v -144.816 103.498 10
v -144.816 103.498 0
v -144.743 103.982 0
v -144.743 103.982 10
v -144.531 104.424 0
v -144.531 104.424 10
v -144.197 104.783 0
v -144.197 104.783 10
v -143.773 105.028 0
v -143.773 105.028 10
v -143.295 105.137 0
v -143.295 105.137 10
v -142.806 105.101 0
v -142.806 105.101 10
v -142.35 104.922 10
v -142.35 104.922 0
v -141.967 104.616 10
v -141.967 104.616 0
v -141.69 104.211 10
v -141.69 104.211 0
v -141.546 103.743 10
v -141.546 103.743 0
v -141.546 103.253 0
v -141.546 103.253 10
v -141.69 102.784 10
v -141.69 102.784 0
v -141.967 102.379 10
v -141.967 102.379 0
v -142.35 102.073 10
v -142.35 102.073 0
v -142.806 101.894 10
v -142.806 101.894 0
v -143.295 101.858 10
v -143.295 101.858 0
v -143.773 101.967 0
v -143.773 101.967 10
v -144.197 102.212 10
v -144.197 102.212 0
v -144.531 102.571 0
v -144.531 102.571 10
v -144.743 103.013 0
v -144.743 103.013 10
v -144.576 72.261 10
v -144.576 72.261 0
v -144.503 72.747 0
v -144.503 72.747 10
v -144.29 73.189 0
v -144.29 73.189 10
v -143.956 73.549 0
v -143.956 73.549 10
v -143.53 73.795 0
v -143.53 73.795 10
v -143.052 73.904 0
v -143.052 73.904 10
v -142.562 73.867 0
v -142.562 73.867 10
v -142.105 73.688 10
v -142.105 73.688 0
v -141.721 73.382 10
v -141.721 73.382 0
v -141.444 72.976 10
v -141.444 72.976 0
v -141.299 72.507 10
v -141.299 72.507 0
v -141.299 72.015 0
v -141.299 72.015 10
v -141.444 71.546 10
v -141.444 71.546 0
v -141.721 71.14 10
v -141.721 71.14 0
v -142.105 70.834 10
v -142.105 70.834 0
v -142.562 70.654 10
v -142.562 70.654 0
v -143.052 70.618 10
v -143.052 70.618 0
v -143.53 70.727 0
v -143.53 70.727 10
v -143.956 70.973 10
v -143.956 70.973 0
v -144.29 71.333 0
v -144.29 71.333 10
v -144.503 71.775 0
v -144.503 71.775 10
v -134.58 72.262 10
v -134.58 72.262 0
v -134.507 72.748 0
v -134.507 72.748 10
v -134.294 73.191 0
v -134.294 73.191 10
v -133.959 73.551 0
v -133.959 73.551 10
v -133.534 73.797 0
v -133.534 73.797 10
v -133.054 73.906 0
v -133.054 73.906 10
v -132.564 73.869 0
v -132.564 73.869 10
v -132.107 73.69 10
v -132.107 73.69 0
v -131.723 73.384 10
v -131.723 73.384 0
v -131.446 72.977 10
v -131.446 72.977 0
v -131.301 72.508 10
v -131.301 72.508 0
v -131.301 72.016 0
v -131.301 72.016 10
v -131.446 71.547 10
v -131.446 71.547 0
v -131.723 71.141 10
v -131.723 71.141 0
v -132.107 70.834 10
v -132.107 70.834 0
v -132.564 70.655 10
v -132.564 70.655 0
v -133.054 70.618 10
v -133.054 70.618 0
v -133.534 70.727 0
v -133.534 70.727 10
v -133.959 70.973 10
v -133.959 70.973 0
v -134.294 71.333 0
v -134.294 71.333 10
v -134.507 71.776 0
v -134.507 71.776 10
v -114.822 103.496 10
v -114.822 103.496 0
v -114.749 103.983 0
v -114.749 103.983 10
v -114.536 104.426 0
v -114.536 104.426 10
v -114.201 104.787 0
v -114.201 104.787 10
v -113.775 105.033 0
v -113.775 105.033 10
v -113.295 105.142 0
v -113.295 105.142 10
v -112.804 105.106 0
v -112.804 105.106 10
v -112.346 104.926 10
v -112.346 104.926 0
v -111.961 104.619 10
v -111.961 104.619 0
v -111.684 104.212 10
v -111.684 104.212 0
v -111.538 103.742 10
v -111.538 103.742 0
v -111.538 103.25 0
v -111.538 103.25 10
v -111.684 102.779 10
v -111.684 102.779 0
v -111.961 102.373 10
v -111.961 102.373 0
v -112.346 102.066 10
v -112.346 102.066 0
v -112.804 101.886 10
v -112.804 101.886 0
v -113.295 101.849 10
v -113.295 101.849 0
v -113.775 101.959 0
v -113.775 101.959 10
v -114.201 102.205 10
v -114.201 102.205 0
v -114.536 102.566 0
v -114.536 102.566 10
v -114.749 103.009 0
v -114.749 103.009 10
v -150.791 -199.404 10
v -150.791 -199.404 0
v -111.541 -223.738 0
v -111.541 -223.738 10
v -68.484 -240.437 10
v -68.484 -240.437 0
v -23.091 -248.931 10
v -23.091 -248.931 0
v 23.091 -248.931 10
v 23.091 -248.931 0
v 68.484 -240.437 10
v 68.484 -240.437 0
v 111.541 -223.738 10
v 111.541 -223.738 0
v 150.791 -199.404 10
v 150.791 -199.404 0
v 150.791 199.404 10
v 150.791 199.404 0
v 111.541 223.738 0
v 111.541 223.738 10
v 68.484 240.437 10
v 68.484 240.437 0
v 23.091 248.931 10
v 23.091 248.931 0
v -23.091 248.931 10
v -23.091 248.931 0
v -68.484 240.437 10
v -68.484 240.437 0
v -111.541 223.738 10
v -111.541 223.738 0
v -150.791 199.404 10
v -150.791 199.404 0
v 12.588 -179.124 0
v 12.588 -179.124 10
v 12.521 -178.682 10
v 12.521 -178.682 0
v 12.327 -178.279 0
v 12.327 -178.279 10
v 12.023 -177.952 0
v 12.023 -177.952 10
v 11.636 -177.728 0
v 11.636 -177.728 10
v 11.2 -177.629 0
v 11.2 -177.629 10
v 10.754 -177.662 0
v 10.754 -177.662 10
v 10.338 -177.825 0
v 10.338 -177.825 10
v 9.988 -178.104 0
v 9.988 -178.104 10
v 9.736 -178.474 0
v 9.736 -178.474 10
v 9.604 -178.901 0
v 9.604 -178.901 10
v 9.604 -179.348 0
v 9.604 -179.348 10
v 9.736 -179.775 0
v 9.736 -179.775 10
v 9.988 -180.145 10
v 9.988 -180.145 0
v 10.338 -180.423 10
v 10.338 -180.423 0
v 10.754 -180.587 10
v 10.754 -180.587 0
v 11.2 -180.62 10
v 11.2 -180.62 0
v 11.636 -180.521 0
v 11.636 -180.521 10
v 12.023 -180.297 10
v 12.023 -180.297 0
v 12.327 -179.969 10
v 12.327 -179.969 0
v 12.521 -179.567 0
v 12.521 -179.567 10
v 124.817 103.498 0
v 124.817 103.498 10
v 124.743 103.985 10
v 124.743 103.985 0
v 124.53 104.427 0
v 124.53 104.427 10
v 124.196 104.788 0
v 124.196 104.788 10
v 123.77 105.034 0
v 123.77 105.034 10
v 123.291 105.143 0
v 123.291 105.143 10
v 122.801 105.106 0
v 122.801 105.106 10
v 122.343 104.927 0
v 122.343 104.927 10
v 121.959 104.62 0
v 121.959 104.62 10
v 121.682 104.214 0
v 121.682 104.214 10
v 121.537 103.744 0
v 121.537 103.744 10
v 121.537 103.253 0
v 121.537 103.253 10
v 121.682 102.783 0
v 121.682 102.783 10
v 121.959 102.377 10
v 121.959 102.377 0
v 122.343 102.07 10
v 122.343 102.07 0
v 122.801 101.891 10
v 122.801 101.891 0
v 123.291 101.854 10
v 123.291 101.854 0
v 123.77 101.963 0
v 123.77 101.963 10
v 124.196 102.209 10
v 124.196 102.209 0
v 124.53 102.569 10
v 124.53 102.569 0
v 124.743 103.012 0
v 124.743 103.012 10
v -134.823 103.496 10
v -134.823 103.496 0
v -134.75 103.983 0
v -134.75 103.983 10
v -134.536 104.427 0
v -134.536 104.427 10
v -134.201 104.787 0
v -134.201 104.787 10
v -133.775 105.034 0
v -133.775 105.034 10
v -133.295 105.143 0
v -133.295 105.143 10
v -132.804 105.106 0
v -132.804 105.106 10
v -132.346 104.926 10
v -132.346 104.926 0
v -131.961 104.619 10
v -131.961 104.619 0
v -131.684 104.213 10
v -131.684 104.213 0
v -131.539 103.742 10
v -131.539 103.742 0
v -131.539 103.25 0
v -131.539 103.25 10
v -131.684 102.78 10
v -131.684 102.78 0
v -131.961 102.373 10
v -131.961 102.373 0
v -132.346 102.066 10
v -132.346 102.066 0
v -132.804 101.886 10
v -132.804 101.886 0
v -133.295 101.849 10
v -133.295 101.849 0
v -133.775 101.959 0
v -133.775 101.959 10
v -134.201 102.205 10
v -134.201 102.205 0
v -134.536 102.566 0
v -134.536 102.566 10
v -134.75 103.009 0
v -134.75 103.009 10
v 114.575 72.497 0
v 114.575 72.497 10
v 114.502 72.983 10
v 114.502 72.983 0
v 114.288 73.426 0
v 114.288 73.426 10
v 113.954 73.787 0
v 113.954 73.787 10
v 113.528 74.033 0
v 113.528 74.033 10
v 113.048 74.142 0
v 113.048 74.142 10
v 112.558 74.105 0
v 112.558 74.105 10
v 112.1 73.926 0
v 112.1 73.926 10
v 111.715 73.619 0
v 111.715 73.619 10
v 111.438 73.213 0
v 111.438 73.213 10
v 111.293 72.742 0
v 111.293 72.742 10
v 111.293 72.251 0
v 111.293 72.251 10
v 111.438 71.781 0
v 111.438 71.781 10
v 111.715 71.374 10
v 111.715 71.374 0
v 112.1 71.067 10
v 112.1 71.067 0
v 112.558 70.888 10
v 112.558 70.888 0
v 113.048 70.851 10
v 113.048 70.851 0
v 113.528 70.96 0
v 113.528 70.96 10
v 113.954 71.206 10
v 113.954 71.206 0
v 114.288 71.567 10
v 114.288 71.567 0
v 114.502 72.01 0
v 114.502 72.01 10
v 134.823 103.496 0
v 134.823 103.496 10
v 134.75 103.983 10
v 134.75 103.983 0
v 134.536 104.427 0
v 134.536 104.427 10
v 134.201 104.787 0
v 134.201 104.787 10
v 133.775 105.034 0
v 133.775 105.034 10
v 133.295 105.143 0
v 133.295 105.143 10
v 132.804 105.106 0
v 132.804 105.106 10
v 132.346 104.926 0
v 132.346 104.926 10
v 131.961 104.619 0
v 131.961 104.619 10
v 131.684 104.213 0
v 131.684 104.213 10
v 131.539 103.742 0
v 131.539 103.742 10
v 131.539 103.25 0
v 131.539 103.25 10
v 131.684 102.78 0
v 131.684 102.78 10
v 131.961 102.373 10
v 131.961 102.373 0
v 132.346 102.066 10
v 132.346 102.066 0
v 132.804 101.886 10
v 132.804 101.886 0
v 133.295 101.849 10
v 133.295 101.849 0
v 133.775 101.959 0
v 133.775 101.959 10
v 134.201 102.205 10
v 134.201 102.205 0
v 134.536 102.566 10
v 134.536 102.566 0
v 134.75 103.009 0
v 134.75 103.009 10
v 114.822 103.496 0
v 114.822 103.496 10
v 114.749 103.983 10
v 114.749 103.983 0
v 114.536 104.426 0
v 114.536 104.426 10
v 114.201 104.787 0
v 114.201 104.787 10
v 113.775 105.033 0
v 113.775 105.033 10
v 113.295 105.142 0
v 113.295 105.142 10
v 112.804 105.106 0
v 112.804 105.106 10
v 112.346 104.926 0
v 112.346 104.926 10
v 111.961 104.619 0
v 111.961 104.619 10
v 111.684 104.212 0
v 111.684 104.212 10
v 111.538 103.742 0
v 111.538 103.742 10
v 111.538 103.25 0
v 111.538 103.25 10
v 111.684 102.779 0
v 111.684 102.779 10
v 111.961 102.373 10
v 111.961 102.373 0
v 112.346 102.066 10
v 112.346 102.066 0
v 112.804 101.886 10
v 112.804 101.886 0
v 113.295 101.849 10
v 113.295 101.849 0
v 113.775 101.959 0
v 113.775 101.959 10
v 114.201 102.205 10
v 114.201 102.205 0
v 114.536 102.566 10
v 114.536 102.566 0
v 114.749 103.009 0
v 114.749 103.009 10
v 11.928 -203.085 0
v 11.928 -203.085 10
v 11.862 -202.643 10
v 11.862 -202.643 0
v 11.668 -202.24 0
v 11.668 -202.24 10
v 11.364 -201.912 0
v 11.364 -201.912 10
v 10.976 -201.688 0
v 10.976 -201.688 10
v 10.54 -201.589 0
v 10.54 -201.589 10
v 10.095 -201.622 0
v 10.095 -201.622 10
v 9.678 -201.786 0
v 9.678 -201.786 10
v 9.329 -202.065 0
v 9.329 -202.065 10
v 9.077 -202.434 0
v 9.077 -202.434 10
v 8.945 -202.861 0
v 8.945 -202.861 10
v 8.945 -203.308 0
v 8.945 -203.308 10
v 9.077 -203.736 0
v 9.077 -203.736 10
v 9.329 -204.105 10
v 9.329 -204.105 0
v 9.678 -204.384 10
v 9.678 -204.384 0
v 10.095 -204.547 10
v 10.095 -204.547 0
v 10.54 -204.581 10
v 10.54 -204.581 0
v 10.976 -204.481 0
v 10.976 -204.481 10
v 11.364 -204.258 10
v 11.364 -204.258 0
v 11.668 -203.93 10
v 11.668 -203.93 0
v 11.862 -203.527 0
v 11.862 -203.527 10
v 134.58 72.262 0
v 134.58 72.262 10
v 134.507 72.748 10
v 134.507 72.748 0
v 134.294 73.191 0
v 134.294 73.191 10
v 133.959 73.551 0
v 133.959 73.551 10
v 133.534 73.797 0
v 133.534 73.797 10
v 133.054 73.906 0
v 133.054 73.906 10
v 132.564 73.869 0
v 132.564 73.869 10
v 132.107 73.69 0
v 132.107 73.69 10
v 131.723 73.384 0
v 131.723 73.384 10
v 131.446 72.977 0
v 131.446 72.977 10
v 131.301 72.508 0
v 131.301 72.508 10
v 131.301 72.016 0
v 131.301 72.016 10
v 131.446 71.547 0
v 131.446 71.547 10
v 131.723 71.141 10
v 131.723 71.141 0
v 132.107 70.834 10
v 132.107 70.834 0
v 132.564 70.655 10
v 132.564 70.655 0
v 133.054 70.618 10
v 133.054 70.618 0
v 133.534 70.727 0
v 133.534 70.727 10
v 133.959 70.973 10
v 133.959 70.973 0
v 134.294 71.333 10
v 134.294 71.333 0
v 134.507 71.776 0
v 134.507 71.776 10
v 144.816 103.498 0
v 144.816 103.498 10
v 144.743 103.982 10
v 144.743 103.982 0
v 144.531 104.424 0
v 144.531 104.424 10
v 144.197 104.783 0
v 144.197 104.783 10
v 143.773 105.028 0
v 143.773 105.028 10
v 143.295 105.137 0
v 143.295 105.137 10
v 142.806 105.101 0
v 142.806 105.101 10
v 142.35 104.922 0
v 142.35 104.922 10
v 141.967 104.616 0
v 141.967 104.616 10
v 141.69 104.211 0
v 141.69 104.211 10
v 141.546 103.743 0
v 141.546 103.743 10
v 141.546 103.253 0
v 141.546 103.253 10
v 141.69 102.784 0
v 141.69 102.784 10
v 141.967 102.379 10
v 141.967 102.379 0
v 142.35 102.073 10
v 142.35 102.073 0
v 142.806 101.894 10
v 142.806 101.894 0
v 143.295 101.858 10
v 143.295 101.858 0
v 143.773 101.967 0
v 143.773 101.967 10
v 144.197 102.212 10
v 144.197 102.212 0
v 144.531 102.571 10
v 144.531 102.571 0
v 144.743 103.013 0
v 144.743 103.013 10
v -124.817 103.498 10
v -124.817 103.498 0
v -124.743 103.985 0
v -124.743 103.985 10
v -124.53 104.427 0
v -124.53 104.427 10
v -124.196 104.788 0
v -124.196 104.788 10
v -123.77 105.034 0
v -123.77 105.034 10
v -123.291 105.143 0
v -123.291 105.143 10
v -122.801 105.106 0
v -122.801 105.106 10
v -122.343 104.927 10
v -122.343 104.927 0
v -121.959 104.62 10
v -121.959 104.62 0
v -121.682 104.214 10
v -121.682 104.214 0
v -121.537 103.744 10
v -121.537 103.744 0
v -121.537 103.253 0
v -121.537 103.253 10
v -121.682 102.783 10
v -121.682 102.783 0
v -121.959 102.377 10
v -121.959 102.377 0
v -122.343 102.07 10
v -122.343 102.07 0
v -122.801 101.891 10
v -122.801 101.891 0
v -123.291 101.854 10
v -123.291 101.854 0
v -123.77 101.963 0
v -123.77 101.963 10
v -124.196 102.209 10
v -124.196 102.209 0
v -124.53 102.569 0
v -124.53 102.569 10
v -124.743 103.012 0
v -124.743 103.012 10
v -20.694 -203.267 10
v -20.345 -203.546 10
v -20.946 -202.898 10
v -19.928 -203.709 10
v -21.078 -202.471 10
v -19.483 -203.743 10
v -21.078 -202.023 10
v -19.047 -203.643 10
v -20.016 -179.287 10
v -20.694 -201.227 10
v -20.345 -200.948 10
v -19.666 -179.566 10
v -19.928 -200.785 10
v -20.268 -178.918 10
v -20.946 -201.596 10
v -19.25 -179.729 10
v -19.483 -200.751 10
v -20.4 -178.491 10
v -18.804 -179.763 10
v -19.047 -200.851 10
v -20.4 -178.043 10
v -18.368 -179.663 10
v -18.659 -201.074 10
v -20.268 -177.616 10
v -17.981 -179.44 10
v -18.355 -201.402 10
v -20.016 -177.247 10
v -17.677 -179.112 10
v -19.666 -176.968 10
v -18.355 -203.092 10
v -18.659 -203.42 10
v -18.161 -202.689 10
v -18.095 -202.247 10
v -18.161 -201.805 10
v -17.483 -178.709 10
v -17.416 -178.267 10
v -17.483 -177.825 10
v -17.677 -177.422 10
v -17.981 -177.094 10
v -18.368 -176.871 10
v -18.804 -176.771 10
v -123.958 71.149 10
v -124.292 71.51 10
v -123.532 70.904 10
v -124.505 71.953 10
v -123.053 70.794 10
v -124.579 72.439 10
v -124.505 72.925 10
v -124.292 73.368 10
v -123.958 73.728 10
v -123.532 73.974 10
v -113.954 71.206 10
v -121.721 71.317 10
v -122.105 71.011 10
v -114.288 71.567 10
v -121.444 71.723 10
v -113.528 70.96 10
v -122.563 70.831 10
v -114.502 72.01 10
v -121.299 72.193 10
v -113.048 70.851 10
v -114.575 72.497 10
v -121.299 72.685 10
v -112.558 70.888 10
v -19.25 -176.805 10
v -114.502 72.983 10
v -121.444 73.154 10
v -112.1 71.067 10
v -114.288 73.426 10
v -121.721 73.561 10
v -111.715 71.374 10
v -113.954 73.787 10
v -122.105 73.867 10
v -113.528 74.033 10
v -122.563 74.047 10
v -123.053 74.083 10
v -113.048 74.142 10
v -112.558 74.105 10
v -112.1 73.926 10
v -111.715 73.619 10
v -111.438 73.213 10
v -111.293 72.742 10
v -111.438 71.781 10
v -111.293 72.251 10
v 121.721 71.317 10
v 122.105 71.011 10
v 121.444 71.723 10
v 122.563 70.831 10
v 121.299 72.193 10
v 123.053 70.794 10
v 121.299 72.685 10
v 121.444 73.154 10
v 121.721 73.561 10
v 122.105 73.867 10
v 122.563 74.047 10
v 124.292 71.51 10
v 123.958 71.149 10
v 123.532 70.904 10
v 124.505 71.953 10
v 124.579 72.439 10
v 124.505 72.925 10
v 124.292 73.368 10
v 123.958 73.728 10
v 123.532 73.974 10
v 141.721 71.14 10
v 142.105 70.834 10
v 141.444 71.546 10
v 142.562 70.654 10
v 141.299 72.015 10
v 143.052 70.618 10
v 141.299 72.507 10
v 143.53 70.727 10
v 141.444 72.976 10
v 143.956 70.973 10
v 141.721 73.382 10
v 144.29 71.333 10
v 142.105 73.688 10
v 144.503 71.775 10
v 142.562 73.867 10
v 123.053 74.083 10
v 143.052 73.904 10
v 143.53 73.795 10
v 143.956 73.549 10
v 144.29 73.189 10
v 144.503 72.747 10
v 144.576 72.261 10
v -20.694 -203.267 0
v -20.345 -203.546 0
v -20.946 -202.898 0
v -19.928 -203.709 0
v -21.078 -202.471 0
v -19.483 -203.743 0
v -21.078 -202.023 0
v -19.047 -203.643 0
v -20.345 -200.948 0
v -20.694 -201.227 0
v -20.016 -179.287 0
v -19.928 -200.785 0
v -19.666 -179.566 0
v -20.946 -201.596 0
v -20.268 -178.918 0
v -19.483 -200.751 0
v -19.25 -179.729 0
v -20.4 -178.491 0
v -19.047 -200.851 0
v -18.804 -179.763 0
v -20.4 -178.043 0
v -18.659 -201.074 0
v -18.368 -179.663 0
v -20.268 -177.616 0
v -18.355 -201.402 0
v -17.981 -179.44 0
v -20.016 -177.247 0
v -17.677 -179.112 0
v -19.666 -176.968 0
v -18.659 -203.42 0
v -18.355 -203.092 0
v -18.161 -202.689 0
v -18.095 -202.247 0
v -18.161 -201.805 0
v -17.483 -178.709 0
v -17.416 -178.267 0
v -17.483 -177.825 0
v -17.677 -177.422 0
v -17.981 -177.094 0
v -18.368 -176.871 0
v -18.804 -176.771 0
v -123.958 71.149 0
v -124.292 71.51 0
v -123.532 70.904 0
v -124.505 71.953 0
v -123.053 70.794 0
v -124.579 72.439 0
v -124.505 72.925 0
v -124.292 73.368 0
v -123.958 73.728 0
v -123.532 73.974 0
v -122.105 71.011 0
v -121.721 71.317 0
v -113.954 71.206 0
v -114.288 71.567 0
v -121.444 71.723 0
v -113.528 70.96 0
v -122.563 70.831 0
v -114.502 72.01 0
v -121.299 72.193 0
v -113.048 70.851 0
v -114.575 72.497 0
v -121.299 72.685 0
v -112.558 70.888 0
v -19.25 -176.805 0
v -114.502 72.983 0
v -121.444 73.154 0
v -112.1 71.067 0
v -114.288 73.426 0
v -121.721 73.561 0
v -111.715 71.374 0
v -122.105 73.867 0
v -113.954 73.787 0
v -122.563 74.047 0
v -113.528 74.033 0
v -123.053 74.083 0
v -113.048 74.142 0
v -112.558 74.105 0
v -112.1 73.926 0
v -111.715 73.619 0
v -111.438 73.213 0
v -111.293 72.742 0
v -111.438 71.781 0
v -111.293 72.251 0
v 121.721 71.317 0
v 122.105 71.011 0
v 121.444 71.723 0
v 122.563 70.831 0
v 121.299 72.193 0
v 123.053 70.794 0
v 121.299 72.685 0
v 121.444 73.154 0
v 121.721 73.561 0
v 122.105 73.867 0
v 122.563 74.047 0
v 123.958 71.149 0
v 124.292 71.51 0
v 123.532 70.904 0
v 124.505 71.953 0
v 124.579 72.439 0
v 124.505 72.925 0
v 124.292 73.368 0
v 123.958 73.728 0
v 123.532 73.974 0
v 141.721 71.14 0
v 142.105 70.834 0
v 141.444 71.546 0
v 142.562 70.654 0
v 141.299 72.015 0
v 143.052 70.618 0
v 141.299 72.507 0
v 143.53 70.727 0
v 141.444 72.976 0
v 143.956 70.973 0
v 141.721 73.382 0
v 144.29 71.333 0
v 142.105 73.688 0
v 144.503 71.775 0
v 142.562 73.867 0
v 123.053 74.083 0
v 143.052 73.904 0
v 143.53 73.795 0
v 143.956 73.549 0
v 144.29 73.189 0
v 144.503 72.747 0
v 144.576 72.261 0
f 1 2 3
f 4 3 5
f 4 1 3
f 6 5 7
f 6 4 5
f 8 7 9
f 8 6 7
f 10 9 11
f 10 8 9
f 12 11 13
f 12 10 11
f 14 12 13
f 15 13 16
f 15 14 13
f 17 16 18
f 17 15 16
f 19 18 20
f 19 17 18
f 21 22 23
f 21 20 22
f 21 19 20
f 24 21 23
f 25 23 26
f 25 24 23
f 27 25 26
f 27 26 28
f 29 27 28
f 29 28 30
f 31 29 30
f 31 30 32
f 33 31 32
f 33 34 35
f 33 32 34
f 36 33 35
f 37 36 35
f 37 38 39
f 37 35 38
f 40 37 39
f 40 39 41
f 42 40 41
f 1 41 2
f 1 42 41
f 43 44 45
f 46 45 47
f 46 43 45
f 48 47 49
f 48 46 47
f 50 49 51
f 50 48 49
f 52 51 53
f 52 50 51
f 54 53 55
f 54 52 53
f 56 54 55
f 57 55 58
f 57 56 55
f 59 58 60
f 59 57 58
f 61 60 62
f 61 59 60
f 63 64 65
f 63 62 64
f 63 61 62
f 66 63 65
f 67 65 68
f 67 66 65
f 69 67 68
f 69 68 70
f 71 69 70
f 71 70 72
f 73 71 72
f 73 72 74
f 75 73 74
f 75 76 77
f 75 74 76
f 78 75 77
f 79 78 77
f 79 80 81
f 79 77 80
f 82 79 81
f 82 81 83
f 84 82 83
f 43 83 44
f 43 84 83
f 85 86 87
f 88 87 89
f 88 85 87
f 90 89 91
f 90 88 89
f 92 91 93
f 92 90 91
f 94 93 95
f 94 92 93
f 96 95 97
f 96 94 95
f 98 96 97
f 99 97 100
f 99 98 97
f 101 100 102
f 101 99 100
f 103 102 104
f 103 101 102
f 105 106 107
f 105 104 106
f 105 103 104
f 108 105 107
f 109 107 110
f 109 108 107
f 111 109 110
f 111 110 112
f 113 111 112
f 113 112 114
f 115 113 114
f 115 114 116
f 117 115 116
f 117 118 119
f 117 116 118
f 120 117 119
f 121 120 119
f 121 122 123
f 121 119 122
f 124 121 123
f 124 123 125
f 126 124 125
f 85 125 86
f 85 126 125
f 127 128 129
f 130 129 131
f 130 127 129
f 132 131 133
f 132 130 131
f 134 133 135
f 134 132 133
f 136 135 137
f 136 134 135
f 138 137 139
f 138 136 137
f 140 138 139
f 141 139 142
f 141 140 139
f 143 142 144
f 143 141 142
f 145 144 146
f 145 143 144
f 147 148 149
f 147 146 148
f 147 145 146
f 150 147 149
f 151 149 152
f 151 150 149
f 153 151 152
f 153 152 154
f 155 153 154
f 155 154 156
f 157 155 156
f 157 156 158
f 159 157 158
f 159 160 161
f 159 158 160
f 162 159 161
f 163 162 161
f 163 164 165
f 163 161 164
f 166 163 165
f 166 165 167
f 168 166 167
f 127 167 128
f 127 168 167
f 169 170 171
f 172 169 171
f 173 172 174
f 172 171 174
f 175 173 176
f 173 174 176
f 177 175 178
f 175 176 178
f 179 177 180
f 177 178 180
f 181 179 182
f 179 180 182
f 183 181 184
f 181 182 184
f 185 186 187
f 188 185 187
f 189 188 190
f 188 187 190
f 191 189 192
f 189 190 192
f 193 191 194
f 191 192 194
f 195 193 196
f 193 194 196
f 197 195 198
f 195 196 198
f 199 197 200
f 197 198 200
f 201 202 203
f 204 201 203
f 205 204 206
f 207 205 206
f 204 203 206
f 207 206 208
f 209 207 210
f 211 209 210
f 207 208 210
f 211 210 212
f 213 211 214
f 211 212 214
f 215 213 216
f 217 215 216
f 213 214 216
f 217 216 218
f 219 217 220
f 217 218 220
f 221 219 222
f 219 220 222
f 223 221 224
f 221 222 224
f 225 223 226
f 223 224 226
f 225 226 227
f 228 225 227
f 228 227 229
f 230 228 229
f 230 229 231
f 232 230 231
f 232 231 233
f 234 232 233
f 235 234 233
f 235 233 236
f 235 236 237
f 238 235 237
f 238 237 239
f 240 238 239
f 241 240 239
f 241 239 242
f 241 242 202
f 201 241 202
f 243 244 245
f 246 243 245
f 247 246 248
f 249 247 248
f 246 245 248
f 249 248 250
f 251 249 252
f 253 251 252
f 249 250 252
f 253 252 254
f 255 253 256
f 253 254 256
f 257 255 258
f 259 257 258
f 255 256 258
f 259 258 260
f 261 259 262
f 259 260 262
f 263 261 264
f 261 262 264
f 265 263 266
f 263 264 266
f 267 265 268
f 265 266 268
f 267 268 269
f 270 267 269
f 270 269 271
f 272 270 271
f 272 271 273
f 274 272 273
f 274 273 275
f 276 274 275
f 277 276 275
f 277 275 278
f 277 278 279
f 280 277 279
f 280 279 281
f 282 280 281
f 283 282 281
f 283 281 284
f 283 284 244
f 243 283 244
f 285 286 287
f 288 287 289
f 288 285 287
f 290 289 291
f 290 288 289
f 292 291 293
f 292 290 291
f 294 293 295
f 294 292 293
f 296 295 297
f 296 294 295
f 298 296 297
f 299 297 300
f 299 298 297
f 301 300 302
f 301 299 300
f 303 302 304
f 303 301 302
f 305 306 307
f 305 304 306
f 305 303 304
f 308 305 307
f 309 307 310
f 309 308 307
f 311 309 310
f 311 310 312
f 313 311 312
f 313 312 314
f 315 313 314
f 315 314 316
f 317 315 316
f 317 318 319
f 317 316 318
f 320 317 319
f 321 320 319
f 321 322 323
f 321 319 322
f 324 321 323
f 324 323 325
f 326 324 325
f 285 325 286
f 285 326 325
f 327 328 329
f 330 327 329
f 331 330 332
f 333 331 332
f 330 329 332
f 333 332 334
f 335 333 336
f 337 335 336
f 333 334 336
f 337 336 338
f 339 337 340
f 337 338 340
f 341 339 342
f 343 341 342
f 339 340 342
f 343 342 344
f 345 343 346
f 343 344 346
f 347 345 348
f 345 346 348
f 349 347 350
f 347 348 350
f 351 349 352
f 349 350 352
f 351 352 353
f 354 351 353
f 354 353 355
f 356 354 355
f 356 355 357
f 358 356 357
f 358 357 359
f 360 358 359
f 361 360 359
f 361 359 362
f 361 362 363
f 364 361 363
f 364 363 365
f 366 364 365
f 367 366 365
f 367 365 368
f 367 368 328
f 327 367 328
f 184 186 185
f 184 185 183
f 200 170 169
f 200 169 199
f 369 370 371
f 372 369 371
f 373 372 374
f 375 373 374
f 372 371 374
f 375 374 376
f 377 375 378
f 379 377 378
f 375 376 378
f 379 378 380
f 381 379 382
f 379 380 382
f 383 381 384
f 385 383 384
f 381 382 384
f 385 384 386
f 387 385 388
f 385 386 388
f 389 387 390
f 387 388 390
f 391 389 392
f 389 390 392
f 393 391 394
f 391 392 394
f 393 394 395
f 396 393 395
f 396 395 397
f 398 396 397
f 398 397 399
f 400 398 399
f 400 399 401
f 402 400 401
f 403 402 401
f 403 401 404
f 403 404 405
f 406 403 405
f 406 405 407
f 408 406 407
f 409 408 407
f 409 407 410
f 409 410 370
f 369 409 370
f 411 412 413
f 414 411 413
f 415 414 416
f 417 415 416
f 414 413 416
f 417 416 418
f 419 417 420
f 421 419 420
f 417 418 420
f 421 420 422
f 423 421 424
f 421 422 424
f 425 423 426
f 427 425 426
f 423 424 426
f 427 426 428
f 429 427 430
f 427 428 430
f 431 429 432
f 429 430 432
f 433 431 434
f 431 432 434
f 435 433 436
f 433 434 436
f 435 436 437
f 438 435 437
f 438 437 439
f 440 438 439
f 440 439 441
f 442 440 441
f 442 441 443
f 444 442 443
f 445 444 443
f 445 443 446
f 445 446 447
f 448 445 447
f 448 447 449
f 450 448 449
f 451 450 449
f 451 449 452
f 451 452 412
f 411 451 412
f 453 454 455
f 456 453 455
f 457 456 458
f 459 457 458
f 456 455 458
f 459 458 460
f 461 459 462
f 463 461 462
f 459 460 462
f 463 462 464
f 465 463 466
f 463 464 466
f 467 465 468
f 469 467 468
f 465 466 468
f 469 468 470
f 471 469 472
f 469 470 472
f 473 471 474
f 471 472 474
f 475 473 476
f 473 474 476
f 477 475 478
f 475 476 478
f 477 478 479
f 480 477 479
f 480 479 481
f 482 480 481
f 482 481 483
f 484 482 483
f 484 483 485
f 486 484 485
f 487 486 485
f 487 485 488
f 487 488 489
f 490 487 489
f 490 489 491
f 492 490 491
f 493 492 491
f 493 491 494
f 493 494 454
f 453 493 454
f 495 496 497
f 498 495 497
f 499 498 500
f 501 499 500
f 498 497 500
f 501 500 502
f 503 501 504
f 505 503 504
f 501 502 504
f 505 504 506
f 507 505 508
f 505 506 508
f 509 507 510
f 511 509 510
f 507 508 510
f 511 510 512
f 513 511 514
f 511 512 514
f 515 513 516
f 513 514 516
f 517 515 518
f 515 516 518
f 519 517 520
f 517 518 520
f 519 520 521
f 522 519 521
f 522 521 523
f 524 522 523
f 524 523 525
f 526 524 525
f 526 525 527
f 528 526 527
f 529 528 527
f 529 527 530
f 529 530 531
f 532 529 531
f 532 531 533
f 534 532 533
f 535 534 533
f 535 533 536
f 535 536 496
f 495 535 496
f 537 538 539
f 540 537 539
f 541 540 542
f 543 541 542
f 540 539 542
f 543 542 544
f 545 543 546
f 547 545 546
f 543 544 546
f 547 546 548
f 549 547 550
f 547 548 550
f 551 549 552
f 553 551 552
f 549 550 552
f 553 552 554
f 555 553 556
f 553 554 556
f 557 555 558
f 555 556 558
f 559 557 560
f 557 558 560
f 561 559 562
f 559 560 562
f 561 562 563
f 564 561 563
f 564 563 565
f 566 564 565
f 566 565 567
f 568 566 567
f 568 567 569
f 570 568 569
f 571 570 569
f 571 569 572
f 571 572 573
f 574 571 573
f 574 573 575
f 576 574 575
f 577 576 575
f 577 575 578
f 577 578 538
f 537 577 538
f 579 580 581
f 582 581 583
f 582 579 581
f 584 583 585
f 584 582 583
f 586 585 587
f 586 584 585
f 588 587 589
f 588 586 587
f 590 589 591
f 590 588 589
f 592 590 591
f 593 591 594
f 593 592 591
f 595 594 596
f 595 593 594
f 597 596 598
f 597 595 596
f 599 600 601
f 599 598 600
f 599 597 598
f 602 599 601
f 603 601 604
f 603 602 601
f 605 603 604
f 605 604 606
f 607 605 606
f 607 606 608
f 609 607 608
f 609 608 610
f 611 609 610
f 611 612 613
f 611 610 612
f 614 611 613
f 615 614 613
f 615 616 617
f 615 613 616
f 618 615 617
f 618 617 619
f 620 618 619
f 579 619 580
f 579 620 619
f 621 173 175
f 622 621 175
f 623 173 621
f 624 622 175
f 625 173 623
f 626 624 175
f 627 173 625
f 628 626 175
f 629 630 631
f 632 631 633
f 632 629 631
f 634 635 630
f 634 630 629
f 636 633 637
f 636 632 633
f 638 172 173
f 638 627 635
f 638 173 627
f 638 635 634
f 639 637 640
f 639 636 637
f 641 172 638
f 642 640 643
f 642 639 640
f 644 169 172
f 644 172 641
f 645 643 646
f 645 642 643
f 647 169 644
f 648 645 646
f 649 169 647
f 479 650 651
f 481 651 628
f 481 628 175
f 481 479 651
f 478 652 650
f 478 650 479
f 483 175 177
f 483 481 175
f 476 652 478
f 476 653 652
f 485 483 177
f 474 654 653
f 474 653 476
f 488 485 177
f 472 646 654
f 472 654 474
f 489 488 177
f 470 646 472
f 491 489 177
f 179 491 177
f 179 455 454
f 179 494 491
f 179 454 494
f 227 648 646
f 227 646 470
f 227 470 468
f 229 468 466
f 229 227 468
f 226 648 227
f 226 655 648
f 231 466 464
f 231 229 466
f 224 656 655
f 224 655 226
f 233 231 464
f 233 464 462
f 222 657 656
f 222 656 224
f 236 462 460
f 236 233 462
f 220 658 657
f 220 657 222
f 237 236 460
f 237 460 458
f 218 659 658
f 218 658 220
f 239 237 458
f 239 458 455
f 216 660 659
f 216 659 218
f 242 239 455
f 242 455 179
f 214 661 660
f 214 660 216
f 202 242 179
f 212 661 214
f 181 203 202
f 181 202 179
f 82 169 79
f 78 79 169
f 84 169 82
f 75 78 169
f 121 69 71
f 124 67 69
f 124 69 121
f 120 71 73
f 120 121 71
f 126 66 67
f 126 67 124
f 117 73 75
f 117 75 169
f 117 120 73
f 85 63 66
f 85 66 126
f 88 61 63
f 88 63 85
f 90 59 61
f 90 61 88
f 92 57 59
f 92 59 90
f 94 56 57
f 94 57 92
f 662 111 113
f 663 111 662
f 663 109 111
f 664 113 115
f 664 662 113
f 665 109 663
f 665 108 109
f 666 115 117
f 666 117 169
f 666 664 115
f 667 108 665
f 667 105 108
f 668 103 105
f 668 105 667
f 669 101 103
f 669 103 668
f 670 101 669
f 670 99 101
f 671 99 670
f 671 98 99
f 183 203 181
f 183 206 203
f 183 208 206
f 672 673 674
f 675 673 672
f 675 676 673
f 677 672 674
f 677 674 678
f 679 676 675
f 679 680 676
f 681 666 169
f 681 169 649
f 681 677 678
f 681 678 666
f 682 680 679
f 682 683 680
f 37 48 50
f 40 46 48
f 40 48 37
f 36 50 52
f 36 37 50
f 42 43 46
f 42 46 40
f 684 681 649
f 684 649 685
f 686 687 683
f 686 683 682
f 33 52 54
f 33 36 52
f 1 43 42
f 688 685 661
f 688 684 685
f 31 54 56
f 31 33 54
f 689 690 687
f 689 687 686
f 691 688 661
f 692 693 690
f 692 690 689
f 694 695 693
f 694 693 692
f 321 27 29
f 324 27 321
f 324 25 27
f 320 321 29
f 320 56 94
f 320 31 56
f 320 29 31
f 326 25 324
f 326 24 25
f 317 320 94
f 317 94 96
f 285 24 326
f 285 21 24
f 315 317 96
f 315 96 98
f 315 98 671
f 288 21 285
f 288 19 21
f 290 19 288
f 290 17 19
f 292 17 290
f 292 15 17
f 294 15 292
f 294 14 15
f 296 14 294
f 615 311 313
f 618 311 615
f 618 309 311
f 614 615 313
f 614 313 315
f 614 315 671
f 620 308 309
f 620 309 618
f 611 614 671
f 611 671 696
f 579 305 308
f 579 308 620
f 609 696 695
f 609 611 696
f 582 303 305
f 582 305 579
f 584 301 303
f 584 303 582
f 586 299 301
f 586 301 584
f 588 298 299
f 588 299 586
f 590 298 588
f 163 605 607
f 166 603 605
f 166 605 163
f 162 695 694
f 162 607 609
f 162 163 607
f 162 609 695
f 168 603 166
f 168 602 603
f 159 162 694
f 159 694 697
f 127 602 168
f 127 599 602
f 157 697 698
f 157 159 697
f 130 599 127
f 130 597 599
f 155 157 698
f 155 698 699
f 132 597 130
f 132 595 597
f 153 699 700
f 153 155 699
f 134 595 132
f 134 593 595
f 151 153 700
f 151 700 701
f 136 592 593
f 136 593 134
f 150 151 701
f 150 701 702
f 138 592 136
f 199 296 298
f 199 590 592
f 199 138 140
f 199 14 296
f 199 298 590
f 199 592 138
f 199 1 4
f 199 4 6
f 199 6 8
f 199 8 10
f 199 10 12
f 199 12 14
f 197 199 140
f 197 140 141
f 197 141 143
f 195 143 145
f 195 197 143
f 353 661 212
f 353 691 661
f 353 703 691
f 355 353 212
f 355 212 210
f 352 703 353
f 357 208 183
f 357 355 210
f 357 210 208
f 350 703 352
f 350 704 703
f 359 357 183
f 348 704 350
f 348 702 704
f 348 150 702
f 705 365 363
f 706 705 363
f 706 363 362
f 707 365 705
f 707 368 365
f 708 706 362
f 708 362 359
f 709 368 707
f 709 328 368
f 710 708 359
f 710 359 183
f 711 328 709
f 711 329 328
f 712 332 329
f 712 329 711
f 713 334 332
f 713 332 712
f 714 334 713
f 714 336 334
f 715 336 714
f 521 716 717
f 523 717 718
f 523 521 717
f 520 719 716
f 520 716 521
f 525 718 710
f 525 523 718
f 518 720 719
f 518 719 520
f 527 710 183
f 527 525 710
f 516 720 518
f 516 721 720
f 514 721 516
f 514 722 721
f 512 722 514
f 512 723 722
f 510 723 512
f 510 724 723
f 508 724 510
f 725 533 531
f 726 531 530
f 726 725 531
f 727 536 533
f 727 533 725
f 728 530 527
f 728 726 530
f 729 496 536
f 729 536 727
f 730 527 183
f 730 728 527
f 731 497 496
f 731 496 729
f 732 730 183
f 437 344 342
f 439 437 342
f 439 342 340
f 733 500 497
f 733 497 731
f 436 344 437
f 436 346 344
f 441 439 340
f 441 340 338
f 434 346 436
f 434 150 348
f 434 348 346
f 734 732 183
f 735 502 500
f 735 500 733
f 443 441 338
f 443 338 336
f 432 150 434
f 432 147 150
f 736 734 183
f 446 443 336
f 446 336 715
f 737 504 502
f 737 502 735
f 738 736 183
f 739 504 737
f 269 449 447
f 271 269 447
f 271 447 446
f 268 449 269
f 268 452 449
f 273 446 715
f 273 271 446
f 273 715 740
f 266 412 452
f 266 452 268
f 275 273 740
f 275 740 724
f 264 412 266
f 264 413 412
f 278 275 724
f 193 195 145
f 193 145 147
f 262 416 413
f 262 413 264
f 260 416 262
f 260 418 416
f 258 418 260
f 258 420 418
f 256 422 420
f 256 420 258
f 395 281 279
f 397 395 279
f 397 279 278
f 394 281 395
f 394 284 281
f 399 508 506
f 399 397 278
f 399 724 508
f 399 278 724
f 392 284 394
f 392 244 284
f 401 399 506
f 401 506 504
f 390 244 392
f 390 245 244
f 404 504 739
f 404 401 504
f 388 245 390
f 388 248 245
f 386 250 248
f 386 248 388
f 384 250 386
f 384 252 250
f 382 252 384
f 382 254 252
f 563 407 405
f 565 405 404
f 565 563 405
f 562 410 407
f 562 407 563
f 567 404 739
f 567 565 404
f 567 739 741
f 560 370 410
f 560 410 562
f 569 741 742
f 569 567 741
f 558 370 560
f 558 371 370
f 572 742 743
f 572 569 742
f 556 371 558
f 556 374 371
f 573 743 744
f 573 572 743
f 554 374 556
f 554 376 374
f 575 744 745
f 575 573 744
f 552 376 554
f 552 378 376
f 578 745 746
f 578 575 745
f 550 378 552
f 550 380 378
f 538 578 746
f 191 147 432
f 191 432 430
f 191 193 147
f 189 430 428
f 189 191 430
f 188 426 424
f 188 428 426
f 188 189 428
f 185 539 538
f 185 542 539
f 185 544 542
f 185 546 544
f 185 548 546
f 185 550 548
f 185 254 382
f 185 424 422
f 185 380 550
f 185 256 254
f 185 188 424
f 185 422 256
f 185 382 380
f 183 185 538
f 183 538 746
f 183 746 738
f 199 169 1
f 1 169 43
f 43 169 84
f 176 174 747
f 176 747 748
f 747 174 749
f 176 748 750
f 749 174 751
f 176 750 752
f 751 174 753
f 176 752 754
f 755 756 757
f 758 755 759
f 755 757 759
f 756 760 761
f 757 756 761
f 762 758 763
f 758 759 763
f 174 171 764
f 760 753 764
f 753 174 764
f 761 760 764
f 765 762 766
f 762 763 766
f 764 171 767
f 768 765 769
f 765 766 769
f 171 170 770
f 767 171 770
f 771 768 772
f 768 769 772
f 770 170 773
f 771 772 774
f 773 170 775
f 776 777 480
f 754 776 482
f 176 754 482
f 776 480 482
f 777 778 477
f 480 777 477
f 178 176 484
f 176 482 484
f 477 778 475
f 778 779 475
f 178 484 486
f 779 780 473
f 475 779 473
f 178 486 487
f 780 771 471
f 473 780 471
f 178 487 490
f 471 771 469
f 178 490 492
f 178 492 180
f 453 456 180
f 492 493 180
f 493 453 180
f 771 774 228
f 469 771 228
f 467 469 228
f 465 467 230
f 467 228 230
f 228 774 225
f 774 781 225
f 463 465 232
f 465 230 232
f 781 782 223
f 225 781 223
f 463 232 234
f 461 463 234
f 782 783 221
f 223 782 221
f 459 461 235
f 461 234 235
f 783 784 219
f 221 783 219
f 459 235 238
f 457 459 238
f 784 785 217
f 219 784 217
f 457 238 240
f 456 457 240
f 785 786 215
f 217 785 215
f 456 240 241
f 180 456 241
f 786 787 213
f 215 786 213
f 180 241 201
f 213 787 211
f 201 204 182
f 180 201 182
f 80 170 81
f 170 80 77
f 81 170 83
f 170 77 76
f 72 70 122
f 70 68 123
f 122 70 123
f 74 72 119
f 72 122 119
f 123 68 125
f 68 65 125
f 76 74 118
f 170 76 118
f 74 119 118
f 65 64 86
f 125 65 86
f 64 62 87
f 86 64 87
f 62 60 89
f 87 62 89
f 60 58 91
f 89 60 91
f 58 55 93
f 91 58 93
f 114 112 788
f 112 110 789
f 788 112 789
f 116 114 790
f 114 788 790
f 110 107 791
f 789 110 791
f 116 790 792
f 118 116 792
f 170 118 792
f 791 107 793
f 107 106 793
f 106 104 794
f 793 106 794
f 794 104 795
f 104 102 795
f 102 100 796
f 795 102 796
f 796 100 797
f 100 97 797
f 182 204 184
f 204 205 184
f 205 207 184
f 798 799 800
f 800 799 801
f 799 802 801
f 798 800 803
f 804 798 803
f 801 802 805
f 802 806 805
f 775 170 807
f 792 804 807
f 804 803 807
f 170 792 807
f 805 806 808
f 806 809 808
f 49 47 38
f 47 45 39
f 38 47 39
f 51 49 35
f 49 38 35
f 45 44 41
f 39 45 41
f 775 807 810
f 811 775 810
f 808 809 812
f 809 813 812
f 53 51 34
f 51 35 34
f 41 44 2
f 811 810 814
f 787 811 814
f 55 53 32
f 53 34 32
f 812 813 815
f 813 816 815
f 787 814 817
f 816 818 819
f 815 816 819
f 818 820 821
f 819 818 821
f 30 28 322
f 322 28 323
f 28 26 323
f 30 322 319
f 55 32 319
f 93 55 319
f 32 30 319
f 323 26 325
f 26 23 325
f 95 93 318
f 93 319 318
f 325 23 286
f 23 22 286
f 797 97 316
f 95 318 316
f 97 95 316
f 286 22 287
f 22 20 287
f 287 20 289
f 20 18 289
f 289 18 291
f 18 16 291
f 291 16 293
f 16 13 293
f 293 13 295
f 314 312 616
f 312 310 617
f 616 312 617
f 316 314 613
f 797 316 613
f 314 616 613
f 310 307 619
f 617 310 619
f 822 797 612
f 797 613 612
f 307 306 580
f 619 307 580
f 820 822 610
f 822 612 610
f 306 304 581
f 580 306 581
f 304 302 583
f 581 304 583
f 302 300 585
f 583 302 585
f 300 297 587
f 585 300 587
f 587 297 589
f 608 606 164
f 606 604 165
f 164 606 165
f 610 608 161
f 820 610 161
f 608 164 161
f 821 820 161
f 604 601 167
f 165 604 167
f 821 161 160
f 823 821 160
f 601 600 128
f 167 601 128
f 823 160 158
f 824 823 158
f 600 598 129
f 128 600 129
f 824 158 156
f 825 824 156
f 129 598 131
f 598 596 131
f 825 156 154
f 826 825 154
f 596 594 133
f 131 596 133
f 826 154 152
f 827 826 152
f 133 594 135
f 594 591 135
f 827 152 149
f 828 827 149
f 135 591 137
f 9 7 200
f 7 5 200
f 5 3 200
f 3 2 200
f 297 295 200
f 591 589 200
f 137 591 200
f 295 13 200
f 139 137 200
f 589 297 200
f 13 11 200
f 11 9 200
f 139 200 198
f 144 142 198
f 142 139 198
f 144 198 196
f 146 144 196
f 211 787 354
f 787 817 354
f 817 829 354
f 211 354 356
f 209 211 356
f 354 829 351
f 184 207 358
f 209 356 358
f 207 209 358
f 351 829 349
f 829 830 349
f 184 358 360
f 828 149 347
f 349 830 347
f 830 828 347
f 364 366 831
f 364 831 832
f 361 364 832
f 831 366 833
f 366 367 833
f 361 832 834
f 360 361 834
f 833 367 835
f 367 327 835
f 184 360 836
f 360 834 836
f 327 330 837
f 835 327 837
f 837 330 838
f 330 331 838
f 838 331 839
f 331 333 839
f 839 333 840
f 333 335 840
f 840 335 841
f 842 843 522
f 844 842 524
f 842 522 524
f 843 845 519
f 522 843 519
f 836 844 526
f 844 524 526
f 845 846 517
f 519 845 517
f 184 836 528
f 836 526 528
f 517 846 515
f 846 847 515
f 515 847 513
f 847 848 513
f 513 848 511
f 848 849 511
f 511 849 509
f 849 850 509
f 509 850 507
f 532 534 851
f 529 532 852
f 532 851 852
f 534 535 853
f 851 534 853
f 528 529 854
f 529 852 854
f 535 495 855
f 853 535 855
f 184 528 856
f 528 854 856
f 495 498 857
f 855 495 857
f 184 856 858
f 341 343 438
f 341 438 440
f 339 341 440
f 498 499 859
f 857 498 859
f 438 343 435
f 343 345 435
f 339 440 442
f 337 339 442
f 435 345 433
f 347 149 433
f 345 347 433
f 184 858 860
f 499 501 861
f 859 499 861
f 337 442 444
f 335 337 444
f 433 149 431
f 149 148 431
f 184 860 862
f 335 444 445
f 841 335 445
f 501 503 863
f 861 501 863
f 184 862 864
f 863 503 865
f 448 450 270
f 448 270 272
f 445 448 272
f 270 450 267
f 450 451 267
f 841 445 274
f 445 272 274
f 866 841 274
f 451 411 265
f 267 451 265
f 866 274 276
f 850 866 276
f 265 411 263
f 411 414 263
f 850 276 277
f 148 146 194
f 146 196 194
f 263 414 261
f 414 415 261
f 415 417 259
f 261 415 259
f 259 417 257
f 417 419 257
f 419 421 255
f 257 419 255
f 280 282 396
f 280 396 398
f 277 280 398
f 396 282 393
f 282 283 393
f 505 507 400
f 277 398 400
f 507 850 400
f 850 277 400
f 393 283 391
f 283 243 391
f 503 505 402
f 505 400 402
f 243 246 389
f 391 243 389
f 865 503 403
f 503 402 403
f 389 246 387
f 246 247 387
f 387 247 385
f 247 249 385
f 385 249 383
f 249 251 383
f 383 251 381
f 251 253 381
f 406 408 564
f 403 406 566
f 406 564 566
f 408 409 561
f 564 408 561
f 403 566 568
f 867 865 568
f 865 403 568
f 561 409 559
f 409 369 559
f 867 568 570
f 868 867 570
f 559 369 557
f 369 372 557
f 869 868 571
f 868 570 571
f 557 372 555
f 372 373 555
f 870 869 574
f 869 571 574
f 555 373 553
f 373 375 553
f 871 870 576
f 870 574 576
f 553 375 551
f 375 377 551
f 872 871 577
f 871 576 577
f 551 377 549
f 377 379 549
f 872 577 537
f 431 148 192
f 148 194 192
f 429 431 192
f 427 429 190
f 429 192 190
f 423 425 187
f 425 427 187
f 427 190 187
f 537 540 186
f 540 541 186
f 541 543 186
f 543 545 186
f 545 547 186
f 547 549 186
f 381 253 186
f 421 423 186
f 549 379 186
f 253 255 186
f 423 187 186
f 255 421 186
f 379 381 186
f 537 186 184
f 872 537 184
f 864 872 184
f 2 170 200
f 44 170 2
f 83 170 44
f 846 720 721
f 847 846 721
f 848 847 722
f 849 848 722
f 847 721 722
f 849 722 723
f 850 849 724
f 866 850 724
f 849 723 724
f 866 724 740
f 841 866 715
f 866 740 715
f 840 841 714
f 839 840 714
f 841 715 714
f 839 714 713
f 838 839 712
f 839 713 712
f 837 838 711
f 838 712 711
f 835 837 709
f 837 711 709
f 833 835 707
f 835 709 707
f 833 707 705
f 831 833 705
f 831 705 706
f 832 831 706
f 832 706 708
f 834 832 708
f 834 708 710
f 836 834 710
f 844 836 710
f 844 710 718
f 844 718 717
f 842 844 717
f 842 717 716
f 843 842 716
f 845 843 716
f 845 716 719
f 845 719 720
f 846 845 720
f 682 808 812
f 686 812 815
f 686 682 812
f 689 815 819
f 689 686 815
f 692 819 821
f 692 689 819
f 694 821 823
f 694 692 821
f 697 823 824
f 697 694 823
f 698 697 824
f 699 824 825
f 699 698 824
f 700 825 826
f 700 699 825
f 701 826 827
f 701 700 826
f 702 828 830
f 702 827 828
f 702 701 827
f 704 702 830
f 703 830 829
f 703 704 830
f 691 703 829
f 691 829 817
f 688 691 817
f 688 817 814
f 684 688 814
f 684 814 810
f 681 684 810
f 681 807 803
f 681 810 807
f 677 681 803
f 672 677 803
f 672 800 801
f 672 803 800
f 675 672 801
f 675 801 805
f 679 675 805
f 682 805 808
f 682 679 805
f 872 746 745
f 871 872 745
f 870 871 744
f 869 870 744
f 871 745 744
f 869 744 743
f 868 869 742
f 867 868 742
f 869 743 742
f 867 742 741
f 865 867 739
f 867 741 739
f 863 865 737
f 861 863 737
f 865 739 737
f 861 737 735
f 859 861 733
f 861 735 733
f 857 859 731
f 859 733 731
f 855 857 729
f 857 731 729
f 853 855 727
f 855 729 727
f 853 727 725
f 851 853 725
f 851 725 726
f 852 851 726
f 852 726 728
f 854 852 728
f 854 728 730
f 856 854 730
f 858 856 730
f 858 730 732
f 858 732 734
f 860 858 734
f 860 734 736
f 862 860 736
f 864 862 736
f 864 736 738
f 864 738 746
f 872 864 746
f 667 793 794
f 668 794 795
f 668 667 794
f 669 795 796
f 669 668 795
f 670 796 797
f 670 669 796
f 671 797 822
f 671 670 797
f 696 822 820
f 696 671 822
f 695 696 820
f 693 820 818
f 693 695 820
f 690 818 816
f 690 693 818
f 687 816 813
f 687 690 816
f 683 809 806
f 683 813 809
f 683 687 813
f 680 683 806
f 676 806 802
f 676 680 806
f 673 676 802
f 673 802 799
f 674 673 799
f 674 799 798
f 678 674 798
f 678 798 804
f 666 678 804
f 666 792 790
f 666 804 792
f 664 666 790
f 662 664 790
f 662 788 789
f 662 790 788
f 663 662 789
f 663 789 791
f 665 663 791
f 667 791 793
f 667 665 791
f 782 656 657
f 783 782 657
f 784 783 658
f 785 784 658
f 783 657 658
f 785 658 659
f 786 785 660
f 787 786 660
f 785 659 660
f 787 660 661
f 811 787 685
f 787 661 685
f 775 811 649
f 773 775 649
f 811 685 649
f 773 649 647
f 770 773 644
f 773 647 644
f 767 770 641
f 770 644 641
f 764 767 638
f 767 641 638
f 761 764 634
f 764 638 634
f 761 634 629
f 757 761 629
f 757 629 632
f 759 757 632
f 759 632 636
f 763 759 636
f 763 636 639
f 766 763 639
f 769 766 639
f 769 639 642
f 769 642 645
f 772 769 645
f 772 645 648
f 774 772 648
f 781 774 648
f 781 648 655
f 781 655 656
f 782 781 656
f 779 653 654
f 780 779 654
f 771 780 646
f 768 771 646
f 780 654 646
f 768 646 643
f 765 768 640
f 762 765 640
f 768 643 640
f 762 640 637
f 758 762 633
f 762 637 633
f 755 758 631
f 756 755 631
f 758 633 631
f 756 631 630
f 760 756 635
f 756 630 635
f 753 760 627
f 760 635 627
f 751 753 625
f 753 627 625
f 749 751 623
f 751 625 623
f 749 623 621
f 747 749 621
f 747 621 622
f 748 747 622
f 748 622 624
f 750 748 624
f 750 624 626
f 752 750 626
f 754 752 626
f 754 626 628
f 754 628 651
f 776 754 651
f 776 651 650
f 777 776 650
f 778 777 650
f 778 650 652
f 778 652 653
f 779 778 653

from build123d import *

# Parameters (mm, degrees)
PAD_DEPTH       = 10
SKETCH001_R     = 1.644392
SKETCH001_R_2   = 1.65157
SKETCH001_R_3   = 1.649148
SKETCH001_R_4   = 1.651214
SKETCH001_R_5   = 1.647788
SKETCH001_R_6   = 1.648804
SKETCH001_R_7   = 1.649175
SKETCH001_R_8   = 1.65022
POCKET_DEPTH    = 1177.994185
SKETCH002_R     = 1.5
POCKET001_DEPTH = 10.001


with BuildPart() as part:
    # Sketch → Pad (new body)
    with BuildSketch(Plane.XY):
        with BuildLine():
            ThreePointArc((-150.791263, -199.4041), (0, -250), (150.791263, -199.4041))
            Line((150.791263, 199.4041), (150.791263, -199.4041))
            ThreePointArc((150.791263, 199.4041), (0, 250), (-150.791263, 199.4041))
            Line((-150.791263, -199.4041), (-150.791263, 199.4041))
        make_face()
    extrude(amount=PAD_DEPTH)

    # Sketch001 (on Face6 of Pad) → Pocket (cut, through all)
    with BuildSketch(Plane.XY.offset(10)):
        with Locations((143.17194, 103.497585)):
            Circle(SKETCH001_R)
        with Locations((133.171706, 103.496141)):
            Circle(SKETCH001_R_2)
        with Locations((123.167499, 103.498465)):
            Circle(SKETCH001_R_3)
        with Locations((113.171268, 103.495805)):
            Circle(SKETCH001_R_4)
        with Locations((142.928472, 72.260962)):
            Circle(SKETCH001_R_5)
        with Locations((132.931272, 72.262033)):
            Circle(SKETCH001_R_6)
        with Locations((122.929515, 72.438862)):
            Circle(SKETCH001_R_7)
        with Locations((112.924957, 72.496527)):
            Circle(SKETCH001_R_8)
    pocket = extrude(amount=-POCKET_DEPTH, mode=Mode.SUBTRACT)

    # Mirrored: Pocket across Sketch001 V_Axis
    add(pocket.mirror(Plane(origin=(0, 0, 10), x_dir=(0, 0, 1), z_dir=(1, 0, 0))), mode=Mode.SUBTRACT)

    # Sketch002 (on DatumPlane) → Pocket001 (cut, through all)
    with BuildSketch(Plane.XY.offset(10)):
        with Locations((-19.594686, -202.247013)):
            Circle(SKETCH002_R)
        with Locations((10.42839, -203.084781)):
            Circle(SKETCH002_R)
        with Locations((-18.916492, -178.267013)):
            Circle(SKETCH002_R)
        with Locations((11.087714, -179.124447)):
            Circle(SKETCH002_R)
    extrude(amount=-POCKET001_DEPTH, mode=Mode.SUBTRACT)


solid = part.part
